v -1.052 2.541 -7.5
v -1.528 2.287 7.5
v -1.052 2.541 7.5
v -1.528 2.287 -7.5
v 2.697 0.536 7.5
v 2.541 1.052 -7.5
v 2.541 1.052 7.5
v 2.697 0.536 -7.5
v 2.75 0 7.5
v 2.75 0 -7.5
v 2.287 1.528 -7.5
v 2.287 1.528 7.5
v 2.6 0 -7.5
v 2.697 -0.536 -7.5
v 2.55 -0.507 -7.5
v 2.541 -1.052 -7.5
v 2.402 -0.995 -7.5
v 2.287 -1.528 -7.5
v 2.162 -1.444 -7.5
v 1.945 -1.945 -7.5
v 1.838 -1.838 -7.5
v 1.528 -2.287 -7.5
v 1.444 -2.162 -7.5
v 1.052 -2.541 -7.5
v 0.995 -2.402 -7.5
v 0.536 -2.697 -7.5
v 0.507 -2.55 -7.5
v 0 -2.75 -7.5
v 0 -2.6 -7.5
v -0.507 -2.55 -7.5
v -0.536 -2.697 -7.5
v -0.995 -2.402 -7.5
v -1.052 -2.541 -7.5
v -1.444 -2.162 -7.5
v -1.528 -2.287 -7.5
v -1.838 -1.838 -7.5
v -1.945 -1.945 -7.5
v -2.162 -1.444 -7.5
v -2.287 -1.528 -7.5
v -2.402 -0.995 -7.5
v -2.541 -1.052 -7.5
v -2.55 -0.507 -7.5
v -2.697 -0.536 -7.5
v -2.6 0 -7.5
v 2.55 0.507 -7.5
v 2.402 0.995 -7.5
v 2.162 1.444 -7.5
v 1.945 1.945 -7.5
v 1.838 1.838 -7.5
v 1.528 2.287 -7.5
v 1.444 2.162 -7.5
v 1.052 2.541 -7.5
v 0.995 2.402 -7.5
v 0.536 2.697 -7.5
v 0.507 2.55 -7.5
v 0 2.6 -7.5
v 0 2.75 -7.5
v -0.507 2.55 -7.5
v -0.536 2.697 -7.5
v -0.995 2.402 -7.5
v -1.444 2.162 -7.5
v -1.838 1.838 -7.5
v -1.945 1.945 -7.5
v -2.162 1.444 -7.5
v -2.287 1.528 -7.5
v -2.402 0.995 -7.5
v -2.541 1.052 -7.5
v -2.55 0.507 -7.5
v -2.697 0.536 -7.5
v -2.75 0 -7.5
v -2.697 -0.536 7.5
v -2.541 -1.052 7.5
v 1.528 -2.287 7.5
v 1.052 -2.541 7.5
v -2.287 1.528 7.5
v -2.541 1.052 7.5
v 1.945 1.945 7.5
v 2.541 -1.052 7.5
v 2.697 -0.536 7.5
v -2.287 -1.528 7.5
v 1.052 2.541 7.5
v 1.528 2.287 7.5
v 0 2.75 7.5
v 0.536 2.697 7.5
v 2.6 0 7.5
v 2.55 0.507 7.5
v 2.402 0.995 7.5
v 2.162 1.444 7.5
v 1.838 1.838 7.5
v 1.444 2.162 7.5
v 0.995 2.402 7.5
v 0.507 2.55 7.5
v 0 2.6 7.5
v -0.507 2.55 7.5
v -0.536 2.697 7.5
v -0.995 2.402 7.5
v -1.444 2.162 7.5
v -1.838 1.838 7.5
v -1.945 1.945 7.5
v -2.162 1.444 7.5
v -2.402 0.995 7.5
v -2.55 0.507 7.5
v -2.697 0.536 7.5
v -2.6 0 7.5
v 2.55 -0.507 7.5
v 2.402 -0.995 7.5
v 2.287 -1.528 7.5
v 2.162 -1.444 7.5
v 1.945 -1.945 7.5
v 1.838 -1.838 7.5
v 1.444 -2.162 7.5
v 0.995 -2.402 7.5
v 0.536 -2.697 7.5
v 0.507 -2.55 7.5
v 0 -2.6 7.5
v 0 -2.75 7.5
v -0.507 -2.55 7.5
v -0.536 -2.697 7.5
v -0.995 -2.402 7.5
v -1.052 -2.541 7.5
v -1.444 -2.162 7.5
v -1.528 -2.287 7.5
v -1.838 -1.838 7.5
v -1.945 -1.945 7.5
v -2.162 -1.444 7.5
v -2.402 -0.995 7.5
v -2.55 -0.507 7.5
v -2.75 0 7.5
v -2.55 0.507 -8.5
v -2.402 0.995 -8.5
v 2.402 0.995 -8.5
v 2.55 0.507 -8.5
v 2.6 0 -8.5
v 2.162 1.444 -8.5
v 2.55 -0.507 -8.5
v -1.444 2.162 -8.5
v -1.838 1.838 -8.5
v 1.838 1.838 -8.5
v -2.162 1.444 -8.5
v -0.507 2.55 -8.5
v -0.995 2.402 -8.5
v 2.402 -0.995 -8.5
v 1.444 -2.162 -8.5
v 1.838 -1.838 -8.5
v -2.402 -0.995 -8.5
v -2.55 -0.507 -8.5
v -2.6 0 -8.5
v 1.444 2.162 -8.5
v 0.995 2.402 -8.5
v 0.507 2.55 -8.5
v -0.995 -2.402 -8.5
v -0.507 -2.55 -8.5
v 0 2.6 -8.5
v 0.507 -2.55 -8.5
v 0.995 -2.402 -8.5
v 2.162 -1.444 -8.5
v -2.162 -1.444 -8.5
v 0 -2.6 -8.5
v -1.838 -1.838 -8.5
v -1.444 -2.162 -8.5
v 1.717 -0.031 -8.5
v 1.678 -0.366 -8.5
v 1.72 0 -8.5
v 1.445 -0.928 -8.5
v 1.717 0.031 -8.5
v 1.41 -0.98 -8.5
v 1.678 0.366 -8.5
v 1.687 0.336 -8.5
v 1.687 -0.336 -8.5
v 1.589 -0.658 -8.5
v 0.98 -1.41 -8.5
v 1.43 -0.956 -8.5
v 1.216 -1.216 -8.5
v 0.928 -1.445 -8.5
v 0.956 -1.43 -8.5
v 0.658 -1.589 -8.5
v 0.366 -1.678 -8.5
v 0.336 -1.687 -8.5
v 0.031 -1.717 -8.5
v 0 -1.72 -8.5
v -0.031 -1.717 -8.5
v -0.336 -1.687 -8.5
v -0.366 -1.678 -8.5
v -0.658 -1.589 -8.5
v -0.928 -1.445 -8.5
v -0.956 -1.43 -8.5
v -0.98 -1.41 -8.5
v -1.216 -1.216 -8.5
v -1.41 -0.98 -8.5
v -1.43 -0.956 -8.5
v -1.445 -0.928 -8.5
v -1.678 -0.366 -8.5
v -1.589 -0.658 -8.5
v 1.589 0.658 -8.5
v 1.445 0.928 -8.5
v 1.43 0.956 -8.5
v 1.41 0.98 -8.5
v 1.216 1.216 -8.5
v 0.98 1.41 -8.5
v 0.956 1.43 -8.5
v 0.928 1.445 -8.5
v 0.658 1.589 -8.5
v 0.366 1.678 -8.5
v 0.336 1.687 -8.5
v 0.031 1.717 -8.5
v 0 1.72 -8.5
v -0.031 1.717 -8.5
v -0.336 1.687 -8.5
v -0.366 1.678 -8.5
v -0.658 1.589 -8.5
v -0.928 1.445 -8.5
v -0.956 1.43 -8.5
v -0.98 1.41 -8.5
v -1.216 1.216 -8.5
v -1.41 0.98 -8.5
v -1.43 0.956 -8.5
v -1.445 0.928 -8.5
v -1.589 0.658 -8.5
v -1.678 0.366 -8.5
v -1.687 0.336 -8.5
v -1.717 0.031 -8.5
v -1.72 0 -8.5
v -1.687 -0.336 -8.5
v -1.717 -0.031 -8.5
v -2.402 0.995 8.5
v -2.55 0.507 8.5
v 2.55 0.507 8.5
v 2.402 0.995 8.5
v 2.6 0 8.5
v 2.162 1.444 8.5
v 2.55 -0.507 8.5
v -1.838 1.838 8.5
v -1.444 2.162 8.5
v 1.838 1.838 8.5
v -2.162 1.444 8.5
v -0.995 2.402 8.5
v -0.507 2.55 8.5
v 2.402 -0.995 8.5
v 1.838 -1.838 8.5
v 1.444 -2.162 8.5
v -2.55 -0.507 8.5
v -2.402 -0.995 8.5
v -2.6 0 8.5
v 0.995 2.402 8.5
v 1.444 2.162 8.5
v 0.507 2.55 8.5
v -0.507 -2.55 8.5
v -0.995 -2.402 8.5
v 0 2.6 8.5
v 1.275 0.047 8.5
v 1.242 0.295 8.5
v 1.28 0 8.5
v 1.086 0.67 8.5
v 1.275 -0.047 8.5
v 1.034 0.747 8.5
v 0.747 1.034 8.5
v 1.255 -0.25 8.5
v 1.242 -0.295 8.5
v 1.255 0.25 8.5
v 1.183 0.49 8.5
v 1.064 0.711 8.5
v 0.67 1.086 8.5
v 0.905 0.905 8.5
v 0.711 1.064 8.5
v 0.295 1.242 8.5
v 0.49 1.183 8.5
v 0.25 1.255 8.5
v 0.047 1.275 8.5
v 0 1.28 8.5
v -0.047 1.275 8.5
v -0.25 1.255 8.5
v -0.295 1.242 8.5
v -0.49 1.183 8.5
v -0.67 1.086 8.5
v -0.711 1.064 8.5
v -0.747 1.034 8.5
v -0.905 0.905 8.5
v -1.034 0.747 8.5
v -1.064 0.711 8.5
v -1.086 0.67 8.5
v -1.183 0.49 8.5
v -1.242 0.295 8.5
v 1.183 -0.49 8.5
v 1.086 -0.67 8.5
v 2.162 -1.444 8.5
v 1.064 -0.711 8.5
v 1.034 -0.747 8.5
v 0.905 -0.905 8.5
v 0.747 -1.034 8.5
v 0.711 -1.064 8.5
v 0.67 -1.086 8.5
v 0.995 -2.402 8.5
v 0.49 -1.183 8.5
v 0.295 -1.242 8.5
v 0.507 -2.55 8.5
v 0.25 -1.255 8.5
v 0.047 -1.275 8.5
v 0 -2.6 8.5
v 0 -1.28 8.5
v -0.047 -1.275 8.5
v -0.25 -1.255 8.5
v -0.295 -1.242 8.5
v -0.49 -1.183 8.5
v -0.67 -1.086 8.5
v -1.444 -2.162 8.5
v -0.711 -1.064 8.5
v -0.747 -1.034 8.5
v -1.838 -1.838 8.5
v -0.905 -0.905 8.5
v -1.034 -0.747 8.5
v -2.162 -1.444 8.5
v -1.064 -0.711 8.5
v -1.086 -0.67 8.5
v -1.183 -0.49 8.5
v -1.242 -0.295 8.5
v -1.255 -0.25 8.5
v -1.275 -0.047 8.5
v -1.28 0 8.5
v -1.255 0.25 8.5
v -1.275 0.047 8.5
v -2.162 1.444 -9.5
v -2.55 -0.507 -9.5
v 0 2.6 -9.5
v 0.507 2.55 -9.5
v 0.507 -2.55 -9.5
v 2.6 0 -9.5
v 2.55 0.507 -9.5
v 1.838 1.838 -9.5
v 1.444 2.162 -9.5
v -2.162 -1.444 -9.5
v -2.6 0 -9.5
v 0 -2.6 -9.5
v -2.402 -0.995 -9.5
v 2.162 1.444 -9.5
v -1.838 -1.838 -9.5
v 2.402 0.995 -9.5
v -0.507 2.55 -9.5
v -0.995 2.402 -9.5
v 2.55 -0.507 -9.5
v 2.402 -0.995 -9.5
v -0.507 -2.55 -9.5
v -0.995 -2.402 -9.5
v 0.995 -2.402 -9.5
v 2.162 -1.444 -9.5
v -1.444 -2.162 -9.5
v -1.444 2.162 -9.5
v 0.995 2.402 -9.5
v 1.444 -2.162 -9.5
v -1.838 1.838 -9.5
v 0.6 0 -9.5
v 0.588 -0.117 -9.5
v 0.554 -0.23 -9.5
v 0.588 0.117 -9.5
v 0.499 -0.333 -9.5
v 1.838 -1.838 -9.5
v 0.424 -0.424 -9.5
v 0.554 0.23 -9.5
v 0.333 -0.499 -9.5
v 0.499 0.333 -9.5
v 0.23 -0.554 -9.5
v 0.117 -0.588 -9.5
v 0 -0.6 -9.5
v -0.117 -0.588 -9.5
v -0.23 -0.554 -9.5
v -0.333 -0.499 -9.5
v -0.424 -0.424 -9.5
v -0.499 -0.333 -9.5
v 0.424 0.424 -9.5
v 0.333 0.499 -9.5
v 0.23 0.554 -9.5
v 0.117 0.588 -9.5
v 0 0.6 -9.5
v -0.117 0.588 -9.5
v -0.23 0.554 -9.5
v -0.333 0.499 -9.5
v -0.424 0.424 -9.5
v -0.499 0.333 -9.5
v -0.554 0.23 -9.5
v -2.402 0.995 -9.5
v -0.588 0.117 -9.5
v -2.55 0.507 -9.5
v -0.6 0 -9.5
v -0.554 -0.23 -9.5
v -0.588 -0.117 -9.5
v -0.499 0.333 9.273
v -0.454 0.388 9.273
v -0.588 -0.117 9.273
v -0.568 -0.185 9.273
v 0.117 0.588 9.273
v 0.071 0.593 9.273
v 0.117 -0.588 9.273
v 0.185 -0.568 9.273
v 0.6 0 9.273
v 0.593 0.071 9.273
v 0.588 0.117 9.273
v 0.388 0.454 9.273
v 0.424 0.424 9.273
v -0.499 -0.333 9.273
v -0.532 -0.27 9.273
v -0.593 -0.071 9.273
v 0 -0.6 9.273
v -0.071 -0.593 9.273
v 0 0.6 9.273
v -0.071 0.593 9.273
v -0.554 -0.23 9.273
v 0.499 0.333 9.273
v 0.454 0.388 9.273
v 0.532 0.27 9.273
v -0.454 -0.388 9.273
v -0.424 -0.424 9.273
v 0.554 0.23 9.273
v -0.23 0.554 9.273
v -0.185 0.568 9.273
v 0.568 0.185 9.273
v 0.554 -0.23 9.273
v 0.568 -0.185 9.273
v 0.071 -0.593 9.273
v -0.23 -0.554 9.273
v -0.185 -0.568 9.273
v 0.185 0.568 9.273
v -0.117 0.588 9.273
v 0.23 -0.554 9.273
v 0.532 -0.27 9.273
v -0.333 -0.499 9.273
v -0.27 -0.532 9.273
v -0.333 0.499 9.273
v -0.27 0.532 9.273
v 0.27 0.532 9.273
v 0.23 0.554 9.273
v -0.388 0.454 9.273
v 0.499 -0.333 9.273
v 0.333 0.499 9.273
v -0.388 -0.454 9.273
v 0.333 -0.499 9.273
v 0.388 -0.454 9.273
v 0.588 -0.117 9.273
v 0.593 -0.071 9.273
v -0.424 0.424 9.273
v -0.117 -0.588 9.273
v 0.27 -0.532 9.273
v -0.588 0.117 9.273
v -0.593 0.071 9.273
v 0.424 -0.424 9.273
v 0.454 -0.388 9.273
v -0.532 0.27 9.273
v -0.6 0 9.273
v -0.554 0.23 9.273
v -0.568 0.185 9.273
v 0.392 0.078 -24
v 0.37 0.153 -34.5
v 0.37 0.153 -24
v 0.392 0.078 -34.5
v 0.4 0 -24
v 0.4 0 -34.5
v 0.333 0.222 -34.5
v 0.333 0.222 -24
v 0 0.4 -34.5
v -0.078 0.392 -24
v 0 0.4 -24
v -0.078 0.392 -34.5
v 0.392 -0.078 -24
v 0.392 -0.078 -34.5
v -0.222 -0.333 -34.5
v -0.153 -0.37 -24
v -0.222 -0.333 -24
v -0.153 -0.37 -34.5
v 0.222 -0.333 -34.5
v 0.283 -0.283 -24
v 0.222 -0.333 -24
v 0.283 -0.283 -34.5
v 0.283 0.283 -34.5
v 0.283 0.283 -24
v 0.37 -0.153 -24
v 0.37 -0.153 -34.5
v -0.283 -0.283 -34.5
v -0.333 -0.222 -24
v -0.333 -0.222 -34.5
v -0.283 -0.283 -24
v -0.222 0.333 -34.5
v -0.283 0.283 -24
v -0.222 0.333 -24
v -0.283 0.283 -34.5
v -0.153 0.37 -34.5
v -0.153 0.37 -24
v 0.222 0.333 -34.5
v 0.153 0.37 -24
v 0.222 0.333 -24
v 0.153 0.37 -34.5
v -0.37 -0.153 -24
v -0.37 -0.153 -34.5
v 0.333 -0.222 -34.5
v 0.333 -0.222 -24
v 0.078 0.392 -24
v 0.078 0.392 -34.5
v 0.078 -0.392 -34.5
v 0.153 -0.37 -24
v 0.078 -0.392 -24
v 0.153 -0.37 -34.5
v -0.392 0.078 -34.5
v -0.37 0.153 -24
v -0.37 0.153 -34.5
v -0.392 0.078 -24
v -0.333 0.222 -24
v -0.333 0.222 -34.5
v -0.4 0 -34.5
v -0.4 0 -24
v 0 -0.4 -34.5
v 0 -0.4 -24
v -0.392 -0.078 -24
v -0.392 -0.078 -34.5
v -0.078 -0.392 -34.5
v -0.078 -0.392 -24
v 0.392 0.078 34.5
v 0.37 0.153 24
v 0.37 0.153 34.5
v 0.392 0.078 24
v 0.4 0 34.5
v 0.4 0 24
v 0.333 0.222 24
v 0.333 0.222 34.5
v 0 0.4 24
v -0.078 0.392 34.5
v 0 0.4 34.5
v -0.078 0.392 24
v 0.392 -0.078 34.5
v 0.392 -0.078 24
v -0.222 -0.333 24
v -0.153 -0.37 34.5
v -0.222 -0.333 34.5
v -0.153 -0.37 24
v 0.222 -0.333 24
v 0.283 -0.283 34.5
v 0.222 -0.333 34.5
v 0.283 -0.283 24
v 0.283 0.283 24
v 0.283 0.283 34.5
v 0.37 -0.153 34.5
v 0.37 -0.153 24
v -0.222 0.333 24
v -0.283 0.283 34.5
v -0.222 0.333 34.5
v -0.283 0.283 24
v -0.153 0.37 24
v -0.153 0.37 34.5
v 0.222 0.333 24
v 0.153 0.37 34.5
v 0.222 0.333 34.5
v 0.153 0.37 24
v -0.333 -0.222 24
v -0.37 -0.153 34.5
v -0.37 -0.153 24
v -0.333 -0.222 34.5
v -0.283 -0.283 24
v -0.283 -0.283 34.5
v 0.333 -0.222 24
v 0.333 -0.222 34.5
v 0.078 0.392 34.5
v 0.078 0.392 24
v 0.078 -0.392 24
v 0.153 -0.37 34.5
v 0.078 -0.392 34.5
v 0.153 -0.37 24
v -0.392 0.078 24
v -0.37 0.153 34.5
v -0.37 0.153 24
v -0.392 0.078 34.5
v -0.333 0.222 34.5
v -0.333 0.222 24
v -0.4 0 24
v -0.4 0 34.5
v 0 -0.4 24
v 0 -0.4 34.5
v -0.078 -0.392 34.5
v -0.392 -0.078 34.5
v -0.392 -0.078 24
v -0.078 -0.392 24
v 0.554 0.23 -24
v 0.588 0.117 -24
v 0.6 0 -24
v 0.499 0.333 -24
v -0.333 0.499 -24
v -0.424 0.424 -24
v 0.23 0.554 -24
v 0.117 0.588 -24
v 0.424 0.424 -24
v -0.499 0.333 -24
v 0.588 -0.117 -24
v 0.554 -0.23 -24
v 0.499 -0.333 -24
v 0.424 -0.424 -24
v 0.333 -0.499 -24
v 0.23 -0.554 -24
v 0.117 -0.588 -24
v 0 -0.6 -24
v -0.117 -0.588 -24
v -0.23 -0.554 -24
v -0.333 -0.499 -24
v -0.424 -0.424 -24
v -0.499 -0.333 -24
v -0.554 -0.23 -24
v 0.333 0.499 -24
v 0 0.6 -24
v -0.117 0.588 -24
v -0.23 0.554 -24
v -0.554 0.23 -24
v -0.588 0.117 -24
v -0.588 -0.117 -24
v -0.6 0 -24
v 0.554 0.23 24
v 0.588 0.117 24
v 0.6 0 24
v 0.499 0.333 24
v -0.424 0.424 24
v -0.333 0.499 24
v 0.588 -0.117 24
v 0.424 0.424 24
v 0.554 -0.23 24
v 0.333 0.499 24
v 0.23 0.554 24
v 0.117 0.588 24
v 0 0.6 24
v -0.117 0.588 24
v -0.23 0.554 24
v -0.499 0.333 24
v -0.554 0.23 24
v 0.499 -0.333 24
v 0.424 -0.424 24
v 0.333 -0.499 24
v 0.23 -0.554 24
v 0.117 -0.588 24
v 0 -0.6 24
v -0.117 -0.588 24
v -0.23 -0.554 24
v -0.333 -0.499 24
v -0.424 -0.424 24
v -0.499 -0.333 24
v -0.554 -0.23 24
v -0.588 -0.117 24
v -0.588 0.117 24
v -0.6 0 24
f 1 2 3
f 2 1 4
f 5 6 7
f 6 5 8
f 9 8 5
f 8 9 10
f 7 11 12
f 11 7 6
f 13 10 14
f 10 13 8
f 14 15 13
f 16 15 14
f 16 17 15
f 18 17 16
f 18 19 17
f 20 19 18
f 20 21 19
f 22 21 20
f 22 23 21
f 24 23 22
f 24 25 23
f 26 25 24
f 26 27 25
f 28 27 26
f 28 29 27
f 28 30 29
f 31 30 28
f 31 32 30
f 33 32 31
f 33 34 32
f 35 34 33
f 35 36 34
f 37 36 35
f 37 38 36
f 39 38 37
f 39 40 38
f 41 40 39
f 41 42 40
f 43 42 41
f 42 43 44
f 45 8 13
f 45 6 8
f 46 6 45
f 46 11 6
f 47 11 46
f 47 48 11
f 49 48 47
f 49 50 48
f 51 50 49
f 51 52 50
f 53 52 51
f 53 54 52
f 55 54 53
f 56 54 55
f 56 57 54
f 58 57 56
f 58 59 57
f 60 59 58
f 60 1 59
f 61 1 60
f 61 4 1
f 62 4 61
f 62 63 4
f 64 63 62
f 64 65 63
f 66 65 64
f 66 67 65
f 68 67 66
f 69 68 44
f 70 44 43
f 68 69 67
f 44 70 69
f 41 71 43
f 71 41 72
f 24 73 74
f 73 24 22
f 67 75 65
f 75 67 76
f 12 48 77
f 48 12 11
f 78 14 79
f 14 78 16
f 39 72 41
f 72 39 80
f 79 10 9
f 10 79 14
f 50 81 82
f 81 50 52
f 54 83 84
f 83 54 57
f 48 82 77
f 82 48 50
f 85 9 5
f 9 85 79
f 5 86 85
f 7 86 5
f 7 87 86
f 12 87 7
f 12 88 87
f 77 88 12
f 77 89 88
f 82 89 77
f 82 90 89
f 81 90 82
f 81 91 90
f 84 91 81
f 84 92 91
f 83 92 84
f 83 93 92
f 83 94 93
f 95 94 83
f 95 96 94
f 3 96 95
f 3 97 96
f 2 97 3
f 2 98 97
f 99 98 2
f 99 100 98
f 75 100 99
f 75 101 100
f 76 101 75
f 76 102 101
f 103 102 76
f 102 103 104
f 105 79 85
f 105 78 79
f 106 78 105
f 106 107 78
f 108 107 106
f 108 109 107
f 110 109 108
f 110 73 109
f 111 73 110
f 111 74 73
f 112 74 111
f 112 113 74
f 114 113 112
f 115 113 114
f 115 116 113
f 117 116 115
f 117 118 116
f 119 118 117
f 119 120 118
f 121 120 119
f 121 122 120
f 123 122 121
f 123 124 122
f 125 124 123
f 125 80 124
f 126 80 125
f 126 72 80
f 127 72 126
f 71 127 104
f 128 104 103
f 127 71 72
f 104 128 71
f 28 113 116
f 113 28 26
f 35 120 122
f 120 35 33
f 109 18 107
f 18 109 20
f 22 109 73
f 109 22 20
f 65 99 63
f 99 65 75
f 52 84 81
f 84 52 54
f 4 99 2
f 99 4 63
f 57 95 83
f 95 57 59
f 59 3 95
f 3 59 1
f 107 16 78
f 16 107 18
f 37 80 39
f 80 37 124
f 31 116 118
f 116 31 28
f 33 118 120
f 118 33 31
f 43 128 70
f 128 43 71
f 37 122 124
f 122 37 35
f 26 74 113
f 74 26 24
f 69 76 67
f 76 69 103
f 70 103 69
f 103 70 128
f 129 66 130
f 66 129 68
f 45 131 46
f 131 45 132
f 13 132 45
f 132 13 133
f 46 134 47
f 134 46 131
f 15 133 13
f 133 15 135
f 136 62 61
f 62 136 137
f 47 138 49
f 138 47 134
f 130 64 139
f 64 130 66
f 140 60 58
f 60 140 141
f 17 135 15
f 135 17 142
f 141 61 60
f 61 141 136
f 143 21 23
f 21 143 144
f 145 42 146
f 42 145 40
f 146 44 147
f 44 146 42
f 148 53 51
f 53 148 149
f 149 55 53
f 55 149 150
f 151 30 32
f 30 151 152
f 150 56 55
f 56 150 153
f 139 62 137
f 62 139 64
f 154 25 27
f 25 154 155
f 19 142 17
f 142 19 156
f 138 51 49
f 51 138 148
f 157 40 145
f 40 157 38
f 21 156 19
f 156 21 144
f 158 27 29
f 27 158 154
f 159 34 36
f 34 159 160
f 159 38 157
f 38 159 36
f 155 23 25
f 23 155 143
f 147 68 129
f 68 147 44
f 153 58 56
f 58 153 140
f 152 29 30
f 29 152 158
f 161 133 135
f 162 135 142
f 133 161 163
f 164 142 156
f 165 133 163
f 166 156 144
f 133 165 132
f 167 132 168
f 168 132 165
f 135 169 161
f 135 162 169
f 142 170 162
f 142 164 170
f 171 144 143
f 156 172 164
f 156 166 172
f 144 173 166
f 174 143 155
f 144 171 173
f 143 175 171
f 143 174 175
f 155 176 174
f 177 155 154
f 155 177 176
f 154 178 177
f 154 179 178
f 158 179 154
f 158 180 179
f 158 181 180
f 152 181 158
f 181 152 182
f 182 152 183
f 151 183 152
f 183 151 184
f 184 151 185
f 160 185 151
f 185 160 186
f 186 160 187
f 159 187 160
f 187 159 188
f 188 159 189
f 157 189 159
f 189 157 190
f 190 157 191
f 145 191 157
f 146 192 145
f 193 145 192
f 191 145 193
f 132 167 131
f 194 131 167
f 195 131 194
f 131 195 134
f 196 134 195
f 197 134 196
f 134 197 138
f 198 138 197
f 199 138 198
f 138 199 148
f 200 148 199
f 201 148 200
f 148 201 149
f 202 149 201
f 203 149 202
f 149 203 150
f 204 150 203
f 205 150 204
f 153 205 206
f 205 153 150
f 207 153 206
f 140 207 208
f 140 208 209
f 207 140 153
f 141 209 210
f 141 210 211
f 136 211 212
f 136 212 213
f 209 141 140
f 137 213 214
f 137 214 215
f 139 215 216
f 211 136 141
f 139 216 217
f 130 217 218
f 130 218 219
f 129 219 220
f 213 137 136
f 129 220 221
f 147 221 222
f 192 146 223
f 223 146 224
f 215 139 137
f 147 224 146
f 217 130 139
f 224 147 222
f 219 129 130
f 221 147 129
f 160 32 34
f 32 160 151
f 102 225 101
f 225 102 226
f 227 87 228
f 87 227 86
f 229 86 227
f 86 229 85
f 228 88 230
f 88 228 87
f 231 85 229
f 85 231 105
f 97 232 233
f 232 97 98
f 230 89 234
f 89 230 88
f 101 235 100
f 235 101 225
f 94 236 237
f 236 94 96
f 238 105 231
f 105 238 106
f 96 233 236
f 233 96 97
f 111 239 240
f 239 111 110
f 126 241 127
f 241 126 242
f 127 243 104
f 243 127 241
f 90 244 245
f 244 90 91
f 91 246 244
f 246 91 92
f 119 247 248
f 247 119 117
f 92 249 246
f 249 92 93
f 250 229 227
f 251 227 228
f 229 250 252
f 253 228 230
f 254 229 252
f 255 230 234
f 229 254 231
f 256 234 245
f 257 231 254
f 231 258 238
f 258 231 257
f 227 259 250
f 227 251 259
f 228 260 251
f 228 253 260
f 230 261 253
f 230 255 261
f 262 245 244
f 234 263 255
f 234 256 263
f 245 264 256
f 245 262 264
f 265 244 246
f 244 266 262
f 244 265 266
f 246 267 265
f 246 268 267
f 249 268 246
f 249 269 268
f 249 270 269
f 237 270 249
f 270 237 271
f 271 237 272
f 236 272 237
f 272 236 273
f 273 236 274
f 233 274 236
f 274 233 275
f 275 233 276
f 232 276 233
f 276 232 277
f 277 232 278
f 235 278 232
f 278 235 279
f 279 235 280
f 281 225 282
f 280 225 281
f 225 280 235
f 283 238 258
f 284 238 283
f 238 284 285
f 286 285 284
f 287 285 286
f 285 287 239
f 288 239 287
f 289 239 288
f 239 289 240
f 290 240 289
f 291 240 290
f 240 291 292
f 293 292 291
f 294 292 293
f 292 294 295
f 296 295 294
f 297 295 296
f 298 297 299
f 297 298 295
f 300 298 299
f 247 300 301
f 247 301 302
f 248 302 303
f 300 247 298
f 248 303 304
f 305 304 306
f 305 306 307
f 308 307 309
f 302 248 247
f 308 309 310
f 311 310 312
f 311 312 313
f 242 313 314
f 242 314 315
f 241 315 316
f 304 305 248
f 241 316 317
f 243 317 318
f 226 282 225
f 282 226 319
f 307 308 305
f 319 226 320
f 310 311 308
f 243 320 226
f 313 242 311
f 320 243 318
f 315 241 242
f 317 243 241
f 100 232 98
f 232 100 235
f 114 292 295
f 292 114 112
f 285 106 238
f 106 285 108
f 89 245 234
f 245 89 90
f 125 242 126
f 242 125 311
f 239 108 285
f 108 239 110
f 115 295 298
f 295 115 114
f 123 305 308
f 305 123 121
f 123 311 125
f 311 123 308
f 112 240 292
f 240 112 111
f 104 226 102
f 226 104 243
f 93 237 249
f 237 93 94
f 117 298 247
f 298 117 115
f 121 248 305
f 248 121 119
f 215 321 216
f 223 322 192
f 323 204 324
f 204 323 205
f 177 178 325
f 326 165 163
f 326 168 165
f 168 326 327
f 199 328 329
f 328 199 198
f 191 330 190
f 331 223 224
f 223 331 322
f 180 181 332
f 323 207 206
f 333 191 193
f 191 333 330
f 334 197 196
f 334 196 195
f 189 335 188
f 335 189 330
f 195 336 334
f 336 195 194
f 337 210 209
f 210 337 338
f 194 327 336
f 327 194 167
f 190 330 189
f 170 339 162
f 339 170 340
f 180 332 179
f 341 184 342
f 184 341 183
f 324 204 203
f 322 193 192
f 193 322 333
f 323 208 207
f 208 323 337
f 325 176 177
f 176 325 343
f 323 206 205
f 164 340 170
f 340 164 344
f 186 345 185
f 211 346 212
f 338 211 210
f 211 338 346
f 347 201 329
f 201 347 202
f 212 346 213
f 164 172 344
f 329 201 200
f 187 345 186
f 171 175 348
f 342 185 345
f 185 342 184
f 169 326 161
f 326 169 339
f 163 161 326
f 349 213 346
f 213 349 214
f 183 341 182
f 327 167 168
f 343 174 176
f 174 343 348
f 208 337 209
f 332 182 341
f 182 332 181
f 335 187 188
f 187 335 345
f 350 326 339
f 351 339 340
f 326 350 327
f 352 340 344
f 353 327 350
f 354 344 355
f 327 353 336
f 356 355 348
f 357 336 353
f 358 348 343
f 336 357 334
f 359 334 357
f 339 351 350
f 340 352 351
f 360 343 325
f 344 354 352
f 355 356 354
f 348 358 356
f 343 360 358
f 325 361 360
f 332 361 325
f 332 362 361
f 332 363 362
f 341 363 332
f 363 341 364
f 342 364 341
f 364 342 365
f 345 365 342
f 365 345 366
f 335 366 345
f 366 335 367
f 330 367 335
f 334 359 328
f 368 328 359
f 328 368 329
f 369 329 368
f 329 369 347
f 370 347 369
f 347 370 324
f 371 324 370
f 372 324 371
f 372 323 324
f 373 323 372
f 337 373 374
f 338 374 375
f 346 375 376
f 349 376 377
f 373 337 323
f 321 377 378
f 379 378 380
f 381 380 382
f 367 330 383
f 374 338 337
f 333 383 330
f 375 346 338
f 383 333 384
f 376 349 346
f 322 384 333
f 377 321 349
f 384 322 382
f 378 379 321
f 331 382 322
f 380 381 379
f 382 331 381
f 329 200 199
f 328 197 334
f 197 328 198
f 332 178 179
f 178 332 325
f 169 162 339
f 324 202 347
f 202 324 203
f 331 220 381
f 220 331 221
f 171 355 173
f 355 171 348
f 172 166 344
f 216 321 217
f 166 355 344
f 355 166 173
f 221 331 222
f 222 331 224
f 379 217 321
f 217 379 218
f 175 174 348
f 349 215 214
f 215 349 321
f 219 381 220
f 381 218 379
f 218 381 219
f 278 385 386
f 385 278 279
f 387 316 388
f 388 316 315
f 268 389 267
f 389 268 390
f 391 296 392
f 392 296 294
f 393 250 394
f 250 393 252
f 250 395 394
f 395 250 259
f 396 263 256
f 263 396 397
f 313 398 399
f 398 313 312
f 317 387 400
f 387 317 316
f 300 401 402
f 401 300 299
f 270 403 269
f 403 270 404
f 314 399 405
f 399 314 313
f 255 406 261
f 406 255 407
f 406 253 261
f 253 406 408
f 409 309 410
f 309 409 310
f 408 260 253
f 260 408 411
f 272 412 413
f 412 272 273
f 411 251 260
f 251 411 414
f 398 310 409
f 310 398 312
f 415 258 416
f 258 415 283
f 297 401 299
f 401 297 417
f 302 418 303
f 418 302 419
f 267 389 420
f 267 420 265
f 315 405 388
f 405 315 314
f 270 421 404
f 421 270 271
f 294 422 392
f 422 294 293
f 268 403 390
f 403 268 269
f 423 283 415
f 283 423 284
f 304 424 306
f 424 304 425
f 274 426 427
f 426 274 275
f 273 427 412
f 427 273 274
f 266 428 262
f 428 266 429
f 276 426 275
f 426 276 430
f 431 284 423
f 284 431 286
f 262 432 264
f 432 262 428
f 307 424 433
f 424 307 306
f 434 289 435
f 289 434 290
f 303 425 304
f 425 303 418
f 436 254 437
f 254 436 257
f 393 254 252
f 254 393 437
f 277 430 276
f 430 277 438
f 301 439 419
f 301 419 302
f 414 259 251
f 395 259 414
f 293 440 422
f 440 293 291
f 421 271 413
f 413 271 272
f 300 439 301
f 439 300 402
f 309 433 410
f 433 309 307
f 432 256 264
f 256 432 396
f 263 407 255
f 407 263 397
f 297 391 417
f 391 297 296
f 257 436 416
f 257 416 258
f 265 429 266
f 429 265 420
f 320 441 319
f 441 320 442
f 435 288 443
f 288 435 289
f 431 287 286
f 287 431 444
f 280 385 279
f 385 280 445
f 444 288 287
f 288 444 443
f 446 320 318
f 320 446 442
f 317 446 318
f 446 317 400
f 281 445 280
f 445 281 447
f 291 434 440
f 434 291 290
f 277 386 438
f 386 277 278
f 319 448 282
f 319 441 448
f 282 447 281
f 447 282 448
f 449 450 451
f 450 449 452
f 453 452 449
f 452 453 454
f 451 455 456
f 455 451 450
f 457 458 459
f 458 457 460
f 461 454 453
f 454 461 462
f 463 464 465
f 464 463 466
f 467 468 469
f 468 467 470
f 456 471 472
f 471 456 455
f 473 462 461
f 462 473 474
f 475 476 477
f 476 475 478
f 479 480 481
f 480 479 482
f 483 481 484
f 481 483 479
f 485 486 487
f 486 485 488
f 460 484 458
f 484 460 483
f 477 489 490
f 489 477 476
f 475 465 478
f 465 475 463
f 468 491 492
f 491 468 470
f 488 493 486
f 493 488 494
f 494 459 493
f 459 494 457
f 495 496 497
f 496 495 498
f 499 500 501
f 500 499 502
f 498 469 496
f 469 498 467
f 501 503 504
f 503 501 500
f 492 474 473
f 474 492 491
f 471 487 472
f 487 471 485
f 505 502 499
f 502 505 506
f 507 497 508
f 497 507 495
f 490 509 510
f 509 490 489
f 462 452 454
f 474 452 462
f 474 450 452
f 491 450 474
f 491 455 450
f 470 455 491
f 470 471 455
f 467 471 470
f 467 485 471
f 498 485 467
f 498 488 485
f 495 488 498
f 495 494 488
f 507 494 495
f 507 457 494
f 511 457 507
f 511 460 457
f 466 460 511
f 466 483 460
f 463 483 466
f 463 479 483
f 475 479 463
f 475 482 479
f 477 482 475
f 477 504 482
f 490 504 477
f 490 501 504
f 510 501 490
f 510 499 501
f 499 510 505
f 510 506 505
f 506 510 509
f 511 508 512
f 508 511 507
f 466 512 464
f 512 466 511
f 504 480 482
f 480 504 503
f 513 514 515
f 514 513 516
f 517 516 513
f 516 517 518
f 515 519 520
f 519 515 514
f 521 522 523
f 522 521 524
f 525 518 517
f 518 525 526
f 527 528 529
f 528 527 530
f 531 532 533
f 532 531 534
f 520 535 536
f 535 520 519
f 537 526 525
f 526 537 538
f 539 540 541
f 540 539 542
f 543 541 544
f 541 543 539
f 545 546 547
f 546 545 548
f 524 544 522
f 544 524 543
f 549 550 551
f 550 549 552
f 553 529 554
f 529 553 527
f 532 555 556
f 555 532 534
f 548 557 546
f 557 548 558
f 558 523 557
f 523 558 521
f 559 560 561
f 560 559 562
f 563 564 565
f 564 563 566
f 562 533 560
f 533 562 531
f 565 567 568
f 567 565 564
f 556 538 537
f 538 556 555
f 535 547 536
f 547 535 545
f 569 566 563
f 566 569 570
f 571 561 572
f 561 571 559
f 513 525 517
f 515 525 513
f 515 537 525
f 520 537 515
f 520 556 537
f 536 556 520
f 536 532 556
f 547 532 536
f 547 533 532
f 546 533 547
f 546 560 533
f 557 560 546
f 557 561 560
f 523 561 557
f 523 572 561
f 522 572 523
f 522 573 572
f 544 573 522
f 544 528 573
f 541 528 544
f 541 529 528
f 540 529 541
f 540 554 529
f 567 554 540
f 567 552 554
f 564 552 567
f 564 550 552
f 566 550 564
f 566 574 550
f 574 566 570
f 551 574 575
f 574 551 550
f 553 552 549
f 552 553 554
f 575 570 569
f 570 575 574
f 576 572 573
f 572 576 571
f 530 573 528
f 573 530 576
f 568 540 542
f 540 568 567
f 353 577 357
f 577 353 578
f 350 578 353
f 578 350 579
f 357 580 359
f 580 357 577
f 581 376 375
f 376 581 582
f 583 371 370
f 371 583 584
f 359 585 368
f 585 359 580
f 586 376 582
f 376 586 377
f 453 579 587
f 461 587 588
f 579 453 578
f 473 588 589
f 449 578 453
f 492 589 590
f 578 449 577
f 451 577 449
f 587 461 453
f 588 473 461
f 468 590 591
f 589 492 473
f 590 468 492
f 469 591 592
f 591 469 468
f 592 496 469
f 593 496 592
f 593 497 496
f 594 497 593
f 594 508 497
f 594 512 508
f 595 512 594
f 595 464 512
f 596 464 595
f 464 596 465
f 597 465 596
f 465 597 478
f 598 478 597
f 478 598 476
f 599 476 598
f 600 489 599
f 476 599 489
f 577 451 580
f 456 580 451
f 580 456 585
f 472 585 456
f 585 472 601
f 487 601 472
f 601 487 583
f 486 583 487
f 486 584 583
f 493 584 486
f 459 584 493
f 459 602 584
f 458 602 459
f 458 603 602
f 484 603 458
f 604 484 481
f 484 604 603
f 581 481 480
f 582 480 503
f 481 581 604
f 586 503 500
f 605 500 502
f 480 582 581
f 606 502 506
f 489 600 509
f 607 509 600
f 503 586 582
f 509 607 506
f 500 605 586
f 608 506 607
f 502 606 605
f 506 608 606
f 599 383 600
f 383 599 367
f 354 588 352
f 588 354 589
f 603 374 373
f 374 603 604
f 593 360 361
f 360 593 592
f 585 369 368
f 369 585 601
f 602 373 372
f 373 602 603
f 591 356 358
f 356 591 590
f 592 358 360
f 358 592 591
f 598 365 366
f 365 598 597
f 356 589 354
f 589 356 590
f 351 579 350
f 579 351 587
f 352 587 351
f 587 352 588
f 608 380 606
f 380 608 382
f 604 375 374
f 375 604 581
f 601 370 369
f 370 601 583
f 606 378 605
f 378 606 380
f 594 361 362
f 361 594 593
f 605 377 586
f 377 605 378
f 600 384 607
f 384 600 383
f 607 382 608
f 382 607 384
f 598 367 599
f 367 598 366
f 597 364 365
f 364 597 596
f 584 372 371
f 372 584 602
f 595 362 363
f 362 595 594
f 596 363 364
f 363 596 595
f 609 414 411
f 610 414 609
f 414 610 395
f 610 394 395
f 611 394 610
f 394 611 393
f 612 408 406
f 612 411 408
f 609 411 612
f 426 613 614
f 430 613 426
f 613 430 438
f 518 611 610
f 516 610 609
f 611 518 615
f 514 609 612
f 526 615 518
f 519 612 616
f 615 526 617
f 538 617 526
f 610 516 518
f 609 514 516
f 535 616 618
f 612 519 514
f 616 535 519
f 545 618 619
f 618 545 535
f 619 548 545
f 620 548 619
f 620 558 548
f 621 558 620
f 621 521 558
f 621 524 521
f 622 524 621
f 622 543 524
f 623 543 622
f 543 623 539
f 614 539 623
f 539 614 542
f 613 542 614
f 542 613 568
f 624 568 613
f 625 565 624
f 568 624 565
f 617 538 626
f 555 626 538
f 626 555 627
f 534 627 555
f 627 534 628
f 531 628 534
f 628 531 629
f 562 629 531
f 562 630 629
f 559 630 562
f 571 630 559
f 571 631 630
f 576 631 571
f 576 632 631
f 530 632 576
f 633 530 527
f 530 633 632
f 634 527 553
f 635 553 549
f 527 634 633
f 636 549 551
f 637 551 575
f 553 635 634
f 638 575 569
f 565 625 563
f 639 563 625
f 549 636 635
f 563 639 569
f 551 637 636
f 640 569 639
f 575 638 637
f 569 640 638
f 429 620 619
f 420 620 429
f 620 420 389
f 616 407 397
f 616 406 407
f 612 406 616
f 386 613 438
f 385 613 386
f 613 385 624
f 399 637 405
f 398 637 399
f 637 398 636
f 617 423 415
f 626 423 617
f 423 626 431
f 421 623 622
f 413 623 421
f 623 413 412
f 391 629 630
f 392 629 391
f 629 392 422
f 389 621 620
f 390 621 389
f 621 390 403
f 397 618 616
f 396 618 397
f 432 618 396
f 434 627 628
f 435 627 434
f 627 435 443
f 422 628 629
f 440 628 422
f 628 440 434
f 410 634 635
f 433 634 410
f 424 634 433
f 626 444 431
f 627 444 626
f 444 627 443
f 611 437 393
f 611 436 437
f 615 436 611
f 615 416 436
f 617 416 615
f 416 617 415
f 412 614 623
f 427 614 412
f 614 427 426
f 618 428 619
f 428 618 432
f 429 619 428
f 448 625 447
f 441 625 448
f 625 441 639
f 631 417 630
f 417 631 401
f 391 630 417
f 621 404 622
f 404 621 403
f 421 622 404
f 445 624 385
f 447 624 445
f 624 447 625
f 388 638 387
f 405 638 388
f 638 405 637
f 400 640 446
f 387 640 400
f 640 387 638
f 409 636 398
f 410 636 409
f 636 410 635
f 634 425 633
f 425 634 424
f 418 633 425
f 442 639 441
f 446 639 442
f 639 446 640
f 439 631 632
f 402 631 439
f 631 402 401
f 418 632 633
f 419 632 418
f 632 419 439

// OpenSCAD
// Parameters
resistance_ohms = 6.8; //[3.4:13.6:0.1]
power_w = 3; //[1.5:6:0.5]
body_length_mm = 15; //[8:30:0.5]
body_diameter_mm = 5.5; //[3:11:0.1]
lead_diameter_mm = 0.8; //[0.4:1.6:0.05]
lead_length_each_mm = 25; //[10:50:1]
end_cap_length_mm = 1; //[0.5:2:0.1]
fillet_radius_mm = 0.5; //[0.2:1.0:0.05]
tolerance_mm = 0.2; //[0.05:0.5:0.05]
overlap_mm = 1; //[0.5:2:0.1]
transition_length_mm = 1.5; //[0.8:3:0.1]
cap_diameter_mm = 5.2; //[3:11:0.1]
package_style_axial_flag = 1; //[0:1:1]

// Resistor - complete geometry
module resistor() {
  color("DimGray") {
    // Body
    translate([0, 0, 0])
      cylinder(h=body_length_mm, r=body_diameter_mm/2, center=true, $fn=32);
    
    // End Caps
    translate([0, 0, -(body_length_mm/2 + end_cap_length_mm/2 - overlap_mm/2)])
      cylinder(h=end_cap_length_mm + overlap_mm, r=cap_diameter_mm/2, center=true, $fn=32);
    translate([0, 0, (body_length_mm/2 + end_cap_length_mm/2 - overlap_mm/2)])
      cylinder(h=end_cap_length_mm + overlap_mm, r=cap_diameter_mm/2, center=true, $fn=32);
    
    // Lead Transitions
    translate([0, 0, -(body_length_mm/2 + end_cap_length_mm + transition_length_mm/2 - overlap_mm)])
      cylinder(h=transition_length_mm + overlap_mm, r1=cap_diameter_mm/2, r2=lead_diameter_mm/2, center=true, $fn=32);
    translate([0, 0, (body_length_mm/2 + end_cap_length_mm + transition_length_mm/2 - overlap_mm)])
      cylinder(h=transition_length_mm + overlap_mm, r1=cap_diameter_mm/2, r2=lead_diameter_mm/2, center=true, $fn=32);
    
    // Leads
    translate([0, 0, -(body_length_mm/2 + end_cap_length_mm + transition_length_mm + lead_length_each_mm/2 - overlap_mm)])
      cylinder(h=lead_length_each_mm + overlap_mm, r=lead_diameter_mm/2, center=true, $fn=32);
    translate([0, 0, (body_length_mm/2 + end_cap_length_mm + transition_length_mm + lead_length_each_mm/2 - overlap_mm)])
      cylinder(h=lead_length_each_mm + overlap_mm, r=lead_diameter_mm/2, center=true, $fn=32);
  }
}

// Al Clad Resistor Assembly - complete geometry
module al_clad_resistor_assembly() {
  color("Silver") {
    resistor();
    // Sleeves
    translate([0, 0, -(body_length_mm/2 + end_cap_length_mm + transition_length_mm + (lead_length_each_mm*0.6)/2 - overlap_mm)])
      cylinder(h=lead_length_each_mm*0.6, r=lead_diameter_mm/2 + tolerance_mm, center=true, $fn=32);
    translate([0, 0, (body_length_mm/2 + end_cap_length_mm + transition_length_mm + (lead_length_each_mm*0.6)/2 - overlap_mm)])
      cylinder(h=lead_length_each_mm*0.6, r=lead_diameter_mm/2 + tolerance_mm, center=true, $fn=32);
  }
}

// Sleeved Resistor - complete geometry
module sleeved_resistor() {
  color("Black") {
    resistor();
    // Sleeves
    translate([0, 0, -(body_length_mm/2 + end_cap_length_mm + transition_length_mm + (lead_length_each_mm*0.6)/2 - overlap_mm)])
      cylinder(h=lead_length_each_mm*0.6, r=lead_diameter_mm/2 + tolerance_mm, center=true, $fn=32);
    translate([0, 0, (body_length_mm/2 + end_cap_length_mm + transition_length_mm + (lead_length_each_mm*0.6)/2 - overlap_mm)])
      cylinder(h=lead_length_each_mm*0.6, r=lead_diameter_mm/2 + tolerance_mm, center=true, $fn=32);
  }
}

// Al Clad Resistor - complete geometry
module al_clad_resistor() {
  color("Silver") {
    resistor();
    // Additional Cladding
    translate([0, 0, 0])
      cube([body_diameter_mm*0.9, body_diameter_mm*0.9, body_length_mm*0.2], center=true);
  }
}

// Assembly
module assembly() {
  al_clad_resistor_assembly();
}

assembly();
